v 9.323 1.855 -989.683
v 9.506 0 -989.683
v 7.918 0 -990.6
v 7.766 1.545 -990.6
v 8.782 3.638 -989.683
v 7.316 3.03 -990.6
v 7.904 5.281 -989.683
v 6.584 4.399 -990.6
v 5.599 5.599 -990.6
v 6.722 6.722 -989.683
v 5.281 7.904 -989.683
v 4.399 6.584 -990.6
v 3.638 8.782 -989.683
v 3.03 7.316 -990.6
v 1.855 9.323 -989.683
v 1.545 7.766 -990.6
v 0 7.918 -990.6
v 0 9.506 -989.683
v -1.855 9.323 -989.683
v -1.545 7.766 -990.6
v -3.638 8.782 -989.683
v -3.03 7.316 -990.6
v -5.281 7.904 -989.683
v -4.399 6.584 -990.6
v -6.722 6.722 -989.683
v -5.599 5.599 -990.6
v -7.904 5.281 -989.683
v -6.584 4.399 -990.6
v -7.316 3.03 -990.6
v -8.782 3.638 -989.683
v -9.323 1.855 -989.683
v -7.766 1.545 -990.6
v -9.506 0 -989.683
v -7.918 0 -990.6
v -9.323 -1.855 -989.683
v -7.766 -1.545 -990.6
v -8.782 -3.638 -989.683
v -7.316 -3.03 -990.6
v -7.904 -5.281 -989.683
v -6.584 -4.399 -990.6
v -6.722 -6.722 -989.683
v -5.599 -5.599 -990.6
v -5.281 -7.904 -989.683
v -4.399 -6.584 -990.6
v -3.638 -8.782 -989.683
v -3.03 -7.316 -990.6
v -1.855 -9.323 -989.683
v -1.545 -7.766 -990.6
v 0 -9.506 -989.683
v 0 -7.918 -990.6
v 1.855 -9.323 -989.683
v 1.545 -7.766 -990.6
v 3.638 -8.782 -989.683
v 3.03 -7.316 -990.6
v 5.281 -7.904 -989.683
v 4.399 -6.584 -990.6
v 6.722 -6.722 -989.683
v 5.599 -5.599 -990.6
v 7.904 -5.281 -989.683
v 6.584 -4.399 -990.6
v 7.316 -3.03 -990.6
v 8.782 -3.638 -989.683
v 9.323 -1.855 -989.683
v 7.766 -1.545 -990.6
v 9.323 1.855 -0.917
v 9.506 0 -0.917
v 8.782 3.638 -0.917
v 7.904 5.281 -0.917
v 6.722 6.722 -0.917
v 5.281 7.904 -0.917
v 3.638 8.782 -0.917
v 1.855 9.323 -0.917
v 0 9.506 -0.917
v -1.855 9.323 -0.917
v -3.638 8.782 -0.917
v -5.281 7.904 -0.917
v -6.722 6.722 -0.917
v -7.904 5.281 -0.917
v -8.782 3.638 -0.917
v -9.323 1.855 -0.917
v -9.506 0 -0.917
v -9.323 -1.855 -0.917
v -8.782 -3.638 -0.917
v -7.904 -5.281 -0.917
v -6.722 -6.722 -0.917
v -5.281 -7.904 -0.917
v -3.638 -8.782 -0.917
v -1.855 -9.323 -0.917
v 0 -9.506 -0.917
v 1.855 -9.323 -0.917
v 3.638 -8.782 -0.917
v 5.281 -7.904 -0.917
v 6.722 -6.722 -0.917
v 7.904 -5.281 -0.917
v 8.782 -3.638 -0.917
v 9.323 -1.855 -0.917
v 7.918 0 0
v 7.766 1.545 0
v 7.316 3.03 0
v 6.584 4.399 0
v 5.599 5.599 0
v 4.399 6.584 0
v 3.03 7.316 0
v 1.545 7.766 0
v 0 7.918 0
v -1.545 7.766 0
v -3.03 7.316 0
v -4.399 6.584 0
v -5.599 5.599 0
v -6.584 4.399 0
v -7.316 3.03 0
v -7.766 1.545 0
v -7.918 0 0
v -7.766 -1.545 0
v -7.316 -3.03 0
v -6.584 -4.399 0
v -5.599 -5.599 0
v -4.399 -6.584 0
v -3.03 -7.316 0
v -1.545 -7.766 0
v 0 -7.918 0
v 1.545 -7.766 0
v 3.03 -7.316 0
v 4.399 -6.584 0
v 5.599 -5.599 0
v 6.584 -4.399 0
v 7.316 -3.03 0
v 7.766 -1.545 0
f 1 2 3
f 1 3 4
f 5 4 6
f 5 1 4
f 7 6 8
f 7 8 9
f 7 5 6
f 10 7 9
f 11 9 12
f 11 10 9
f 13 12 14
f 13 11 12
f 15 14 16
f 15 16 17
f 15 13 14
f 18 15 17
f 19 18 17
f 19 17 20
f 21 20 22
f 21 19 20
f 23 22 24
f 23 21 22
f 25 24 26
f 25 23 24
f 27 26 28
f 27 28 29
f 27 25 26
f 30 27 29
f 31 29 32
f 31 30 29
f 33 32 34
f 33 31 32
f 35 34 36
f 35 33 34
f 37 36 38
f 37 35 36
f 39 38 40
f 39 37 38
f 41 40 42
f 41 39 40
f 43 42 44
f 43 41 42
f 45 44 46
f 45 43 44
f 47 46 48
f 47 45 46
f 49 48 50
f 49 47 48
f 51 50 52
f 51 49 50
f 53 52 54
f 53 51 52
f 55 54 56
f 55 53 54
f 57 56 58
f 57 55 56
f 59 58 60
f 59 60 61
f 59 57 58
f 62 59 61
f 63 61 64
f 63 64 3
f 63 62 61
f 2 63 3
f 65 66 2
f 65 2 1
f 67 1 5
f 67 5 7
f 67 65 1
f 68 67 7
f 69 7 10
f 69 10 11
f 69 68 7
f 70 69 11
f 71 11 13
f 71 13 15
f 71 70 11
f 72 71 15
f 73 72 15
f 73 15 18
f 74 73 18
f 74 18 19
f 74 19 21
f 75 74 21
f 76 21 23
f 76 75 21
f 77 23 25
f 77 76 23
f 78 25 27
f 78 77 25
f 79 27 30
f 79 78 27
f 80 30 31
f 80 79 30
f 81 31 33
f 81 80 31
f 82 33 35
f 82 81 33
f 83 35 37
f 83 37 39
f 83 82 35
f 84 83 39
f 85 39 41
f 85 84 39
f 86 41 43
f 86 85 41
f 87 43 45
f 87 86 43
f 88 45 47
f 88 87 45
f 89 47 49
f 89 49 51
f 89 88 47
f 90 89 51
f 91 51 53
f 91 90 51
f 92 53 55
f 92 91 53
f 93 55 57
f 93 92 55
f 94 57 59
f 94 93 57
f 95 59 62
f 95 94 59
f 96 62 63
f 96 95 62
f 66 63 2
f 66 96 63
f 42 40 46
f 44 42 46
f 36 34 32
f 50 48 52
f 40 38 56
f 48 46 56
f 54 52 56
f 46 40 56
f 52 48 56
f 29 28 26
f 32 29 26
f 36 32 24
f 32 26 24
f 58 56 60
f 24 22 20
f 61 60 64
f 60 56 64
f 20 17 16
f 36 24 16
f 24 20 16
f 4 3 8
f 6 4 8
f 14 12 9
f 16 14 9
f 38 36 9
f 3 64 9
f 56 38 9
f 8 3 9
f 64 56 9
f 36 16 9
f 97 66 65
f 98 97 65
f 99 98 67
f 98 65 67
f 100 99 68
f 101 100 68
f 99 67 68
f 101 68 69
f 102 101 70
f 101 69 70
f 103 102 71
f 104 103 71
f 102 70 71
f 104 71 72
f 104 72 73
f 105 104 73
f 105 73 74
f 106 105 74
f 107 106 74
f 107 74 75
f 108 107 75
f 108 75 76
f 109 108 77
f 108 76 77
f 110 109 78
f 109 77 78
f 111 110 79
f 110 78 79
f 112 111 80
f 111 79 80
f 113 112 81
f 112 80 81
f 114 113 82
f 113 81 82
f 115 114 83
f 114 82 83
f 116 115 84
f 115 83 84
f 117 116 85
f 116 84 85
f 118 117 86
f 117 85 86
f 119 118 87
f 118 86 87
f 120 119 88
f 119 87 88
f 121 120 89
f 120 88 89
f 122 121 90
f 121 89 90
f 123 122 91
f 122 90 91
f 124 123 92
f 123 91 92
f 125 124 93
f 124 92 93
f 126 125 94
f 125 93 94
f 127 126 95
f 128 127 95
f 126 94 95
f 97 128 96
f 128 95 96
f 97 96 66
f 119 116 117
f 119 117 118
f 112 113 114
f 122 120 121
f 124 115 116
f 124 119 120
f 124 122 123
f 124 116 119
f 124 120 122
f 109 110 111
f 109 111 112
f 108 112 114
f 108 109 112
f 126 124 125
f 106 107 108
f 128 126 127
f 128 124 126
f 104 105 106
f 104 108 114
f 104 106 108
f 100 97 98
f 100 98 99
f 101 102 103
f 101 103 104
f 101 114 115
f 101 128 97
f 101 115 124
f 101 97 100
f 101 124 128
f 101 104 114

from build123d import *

# Parameters (mm, degrees)
F0_R       = 9.50595
F1_DEPTH   = 990.6
F2_SIZE2   = 0.9165435523
F2_SIZE    = 1.5875
F2_2_SIZE2 = 0.9165435523
F2_2_SIZE  = 1.5875


with BuildPart() as f1:
    # F0 (on Top) → F1 (new body)
    with BuildSketch(Plane.XY):
        Circle(F0_R)
    extrude(amount=-F1_DEPTH)

    # F2
    f2_edges = [f1.edges().sort_by_distance(p)[0] for p in [
        (-9.50595, 0, 0),
    ]]
    f2_side = f1.faces().sort_by_distance((0, 0, 0))[0]
    chamfer(f2_edges, length=F2_SIZE, length2=F2_SIZE2, reference=f2_side)

    # F2#2
    f2_2_edges = [f1.edges().sort_by_distance(p)[0] for p in [
        (-9.50595, 0, -990.6),
    ]]
    f2_2_side = f1.faces().sort_by_distance((0, 0, -990.6))[0]
    chamfer(f2_2_edges, length=F2_2_SIZE, length2=F2_2_SIZE2, reference=f2_2_side)


solid = f1.part
